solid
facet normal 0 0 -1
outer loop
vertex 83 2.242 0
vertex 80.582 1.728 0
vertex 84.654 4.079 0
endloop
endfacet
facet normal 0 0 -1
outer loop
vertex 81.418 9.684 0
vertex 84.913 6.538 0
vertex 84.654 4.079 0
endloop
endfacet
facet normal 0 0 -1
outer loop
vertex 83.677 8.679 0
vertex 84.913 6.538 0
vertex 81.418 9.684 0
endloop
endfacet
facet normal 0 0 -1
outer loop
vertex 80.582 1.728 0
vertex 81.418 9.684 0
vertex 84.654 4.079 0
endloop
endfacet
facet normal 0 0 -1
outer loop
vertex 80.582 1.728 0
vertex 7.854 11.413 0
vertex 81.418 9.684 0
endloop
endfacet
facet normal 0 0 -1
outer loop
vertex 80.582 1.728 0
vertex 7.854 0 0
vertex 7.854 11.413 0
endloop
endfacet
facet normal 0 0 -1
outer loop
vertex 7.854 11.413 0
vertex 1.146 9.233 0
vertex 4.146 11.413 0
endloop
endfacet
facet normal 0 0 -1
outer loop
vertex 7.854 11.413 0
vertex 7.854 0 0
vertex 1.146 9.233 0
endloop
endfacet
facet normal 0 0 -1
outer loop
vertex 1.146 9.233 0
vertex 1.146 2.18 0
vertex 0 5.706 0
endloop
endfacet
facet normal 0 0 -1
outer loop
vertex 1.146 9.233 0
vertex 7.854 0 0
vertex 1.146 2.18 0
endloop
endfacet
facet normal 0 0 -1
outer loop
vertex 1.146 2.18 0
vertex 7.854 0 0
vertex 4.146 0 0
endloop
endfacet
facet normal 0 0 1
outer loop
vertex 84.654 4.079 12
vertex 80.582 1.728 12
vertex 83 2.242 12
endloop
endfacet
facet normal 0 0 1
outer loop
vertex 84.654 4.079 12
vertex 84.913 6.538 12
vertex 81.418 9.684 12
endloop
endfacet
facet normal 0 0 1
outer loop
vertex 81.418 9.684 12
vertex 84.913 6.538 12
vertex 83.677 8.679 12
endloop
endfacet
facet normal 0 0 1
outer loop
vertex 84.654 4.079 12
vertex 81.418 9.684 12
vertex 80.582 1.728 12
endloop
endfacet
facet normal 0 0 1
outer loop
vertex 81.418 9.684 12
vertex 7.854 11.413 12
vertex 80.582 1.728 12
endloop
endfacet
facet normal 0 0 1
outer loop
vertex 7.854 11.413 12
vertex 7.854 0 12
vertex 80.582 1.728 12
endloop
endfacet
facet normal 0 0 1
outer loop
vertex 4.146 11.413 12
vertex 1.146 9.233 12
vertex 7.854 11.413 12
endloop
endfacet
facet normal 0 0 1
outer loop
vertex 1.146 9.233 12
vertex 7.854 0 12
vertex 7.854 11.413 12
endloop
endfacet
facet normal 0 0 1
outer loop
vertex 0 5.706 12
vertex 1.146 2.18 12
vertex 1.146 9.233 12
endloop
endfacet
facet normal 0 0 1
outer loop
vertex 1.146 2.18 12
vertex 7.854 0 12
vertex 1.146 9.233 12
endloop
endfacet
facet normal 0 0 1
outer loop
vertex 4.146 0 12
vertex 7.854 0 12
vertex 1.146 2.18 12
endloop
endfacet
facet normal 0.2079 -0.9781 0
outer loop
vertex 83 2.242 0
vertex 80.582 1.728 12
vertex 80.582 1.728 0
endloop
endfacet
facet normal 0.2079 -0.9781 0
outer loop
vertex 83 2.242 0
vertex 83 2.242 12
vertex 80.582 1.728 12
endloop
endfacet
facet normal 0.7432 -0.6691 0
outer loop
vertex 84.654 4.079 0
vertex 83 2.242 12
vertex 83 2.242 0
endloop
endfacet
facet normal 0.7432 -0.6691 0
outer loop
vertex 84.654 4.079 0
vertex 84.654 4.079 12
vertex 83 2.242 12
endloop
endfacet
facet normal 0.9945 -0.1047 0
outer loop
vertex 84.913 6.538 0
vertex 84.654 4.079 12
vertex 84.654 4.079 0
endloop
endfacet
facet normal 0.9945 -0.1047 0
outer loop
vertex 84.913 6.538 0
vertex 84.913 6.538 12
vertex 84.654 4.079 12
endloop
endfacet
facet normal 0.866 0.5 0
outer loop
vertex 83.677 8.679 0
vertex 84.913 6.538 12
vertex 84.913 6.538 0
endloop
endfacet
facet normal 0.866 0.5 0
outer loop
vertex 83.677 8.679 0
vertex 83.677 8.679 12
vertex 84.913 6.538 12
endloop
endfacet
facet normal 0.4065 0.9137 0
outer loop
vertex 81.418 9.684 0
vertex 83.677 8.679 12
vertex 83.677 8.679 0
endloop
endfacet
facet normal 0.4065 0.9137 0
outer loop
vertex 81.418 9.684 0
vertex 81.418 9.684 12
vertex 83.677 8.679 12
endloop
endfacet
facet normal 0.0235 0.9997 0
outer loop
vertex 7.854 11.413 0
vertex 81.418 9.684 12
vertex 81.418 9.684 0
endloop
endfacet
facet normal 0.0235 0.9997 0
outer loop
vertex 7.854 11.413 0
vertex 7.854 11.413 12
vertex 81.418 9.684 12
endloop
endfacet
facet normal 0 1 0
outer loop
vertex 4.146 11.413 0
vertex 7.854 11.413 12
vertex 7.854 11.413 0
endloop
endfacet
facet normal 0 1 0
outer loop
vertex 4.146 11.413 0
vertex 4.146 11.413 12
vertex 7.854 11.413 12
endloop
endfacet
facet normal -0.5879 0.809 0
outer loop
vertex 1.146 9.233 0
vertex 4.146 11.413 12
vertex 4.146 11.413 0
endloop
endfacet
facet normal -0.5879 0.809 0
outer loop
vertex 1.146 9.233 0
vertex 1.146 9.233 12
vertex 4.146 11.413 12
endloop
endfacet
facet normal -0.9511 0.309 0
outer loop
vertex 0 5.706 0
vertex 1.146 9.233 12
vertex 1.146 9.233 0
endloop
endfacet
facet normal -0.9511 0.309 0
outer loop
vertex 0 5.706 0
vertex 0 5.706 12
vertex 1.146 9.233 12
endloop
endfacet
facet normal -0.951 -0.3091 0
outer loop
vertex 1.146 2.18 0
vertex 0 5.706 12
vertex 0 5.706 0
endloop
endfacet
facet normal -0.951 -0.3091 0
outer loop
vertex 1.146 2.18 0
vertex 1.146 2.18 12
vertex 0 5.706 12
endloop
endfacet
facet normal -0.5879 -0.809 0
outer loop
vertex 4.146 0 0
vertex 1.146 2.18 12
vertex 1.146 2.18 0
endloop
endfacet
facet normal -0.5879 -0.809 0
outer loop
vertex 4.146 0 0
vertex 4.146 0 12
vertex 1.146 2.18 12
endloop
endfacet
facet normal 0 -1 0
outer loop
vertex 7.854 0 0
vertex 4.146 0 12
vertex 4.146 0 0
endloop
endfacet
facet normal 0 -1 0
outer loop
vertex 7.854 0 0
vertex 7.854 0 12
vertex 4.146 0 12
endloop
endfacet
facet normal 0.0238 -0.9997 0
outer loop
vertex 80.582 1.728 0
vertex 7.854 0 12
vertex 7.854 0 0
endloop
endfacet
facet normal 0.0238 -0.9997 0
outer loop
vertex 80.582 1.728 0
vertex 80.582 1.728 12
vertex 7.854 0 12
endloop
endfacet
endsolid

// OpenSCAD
$fn = 32;

// ----------------------------------------------------------------------
// Lever arm: two bosses 12 and 8 mm, 75 mm between centres
// ----------------------------------------------------------------------

// --- parameters (mm) ---
profile_height = 12;      // extrusion height
profile_points = 13;      // points of the closed outline

profile = [[0, 5.706], [1.146, 2.18], [4.146, 0], [7.854, 0], [80.582, 1.728], [83, 2.242], [84.654, 4.079], [84.913, 6.538], [83.677, 8.679], [81.418, 9.684], [7.854, 11.413], [4.146, 11.413], [1.146, 9.233]];  // single closed polygon, 13 points, counter clockwise

// --- the one profile operation ---
linear_extrude(height = profile_height) polygon(points = profile);
